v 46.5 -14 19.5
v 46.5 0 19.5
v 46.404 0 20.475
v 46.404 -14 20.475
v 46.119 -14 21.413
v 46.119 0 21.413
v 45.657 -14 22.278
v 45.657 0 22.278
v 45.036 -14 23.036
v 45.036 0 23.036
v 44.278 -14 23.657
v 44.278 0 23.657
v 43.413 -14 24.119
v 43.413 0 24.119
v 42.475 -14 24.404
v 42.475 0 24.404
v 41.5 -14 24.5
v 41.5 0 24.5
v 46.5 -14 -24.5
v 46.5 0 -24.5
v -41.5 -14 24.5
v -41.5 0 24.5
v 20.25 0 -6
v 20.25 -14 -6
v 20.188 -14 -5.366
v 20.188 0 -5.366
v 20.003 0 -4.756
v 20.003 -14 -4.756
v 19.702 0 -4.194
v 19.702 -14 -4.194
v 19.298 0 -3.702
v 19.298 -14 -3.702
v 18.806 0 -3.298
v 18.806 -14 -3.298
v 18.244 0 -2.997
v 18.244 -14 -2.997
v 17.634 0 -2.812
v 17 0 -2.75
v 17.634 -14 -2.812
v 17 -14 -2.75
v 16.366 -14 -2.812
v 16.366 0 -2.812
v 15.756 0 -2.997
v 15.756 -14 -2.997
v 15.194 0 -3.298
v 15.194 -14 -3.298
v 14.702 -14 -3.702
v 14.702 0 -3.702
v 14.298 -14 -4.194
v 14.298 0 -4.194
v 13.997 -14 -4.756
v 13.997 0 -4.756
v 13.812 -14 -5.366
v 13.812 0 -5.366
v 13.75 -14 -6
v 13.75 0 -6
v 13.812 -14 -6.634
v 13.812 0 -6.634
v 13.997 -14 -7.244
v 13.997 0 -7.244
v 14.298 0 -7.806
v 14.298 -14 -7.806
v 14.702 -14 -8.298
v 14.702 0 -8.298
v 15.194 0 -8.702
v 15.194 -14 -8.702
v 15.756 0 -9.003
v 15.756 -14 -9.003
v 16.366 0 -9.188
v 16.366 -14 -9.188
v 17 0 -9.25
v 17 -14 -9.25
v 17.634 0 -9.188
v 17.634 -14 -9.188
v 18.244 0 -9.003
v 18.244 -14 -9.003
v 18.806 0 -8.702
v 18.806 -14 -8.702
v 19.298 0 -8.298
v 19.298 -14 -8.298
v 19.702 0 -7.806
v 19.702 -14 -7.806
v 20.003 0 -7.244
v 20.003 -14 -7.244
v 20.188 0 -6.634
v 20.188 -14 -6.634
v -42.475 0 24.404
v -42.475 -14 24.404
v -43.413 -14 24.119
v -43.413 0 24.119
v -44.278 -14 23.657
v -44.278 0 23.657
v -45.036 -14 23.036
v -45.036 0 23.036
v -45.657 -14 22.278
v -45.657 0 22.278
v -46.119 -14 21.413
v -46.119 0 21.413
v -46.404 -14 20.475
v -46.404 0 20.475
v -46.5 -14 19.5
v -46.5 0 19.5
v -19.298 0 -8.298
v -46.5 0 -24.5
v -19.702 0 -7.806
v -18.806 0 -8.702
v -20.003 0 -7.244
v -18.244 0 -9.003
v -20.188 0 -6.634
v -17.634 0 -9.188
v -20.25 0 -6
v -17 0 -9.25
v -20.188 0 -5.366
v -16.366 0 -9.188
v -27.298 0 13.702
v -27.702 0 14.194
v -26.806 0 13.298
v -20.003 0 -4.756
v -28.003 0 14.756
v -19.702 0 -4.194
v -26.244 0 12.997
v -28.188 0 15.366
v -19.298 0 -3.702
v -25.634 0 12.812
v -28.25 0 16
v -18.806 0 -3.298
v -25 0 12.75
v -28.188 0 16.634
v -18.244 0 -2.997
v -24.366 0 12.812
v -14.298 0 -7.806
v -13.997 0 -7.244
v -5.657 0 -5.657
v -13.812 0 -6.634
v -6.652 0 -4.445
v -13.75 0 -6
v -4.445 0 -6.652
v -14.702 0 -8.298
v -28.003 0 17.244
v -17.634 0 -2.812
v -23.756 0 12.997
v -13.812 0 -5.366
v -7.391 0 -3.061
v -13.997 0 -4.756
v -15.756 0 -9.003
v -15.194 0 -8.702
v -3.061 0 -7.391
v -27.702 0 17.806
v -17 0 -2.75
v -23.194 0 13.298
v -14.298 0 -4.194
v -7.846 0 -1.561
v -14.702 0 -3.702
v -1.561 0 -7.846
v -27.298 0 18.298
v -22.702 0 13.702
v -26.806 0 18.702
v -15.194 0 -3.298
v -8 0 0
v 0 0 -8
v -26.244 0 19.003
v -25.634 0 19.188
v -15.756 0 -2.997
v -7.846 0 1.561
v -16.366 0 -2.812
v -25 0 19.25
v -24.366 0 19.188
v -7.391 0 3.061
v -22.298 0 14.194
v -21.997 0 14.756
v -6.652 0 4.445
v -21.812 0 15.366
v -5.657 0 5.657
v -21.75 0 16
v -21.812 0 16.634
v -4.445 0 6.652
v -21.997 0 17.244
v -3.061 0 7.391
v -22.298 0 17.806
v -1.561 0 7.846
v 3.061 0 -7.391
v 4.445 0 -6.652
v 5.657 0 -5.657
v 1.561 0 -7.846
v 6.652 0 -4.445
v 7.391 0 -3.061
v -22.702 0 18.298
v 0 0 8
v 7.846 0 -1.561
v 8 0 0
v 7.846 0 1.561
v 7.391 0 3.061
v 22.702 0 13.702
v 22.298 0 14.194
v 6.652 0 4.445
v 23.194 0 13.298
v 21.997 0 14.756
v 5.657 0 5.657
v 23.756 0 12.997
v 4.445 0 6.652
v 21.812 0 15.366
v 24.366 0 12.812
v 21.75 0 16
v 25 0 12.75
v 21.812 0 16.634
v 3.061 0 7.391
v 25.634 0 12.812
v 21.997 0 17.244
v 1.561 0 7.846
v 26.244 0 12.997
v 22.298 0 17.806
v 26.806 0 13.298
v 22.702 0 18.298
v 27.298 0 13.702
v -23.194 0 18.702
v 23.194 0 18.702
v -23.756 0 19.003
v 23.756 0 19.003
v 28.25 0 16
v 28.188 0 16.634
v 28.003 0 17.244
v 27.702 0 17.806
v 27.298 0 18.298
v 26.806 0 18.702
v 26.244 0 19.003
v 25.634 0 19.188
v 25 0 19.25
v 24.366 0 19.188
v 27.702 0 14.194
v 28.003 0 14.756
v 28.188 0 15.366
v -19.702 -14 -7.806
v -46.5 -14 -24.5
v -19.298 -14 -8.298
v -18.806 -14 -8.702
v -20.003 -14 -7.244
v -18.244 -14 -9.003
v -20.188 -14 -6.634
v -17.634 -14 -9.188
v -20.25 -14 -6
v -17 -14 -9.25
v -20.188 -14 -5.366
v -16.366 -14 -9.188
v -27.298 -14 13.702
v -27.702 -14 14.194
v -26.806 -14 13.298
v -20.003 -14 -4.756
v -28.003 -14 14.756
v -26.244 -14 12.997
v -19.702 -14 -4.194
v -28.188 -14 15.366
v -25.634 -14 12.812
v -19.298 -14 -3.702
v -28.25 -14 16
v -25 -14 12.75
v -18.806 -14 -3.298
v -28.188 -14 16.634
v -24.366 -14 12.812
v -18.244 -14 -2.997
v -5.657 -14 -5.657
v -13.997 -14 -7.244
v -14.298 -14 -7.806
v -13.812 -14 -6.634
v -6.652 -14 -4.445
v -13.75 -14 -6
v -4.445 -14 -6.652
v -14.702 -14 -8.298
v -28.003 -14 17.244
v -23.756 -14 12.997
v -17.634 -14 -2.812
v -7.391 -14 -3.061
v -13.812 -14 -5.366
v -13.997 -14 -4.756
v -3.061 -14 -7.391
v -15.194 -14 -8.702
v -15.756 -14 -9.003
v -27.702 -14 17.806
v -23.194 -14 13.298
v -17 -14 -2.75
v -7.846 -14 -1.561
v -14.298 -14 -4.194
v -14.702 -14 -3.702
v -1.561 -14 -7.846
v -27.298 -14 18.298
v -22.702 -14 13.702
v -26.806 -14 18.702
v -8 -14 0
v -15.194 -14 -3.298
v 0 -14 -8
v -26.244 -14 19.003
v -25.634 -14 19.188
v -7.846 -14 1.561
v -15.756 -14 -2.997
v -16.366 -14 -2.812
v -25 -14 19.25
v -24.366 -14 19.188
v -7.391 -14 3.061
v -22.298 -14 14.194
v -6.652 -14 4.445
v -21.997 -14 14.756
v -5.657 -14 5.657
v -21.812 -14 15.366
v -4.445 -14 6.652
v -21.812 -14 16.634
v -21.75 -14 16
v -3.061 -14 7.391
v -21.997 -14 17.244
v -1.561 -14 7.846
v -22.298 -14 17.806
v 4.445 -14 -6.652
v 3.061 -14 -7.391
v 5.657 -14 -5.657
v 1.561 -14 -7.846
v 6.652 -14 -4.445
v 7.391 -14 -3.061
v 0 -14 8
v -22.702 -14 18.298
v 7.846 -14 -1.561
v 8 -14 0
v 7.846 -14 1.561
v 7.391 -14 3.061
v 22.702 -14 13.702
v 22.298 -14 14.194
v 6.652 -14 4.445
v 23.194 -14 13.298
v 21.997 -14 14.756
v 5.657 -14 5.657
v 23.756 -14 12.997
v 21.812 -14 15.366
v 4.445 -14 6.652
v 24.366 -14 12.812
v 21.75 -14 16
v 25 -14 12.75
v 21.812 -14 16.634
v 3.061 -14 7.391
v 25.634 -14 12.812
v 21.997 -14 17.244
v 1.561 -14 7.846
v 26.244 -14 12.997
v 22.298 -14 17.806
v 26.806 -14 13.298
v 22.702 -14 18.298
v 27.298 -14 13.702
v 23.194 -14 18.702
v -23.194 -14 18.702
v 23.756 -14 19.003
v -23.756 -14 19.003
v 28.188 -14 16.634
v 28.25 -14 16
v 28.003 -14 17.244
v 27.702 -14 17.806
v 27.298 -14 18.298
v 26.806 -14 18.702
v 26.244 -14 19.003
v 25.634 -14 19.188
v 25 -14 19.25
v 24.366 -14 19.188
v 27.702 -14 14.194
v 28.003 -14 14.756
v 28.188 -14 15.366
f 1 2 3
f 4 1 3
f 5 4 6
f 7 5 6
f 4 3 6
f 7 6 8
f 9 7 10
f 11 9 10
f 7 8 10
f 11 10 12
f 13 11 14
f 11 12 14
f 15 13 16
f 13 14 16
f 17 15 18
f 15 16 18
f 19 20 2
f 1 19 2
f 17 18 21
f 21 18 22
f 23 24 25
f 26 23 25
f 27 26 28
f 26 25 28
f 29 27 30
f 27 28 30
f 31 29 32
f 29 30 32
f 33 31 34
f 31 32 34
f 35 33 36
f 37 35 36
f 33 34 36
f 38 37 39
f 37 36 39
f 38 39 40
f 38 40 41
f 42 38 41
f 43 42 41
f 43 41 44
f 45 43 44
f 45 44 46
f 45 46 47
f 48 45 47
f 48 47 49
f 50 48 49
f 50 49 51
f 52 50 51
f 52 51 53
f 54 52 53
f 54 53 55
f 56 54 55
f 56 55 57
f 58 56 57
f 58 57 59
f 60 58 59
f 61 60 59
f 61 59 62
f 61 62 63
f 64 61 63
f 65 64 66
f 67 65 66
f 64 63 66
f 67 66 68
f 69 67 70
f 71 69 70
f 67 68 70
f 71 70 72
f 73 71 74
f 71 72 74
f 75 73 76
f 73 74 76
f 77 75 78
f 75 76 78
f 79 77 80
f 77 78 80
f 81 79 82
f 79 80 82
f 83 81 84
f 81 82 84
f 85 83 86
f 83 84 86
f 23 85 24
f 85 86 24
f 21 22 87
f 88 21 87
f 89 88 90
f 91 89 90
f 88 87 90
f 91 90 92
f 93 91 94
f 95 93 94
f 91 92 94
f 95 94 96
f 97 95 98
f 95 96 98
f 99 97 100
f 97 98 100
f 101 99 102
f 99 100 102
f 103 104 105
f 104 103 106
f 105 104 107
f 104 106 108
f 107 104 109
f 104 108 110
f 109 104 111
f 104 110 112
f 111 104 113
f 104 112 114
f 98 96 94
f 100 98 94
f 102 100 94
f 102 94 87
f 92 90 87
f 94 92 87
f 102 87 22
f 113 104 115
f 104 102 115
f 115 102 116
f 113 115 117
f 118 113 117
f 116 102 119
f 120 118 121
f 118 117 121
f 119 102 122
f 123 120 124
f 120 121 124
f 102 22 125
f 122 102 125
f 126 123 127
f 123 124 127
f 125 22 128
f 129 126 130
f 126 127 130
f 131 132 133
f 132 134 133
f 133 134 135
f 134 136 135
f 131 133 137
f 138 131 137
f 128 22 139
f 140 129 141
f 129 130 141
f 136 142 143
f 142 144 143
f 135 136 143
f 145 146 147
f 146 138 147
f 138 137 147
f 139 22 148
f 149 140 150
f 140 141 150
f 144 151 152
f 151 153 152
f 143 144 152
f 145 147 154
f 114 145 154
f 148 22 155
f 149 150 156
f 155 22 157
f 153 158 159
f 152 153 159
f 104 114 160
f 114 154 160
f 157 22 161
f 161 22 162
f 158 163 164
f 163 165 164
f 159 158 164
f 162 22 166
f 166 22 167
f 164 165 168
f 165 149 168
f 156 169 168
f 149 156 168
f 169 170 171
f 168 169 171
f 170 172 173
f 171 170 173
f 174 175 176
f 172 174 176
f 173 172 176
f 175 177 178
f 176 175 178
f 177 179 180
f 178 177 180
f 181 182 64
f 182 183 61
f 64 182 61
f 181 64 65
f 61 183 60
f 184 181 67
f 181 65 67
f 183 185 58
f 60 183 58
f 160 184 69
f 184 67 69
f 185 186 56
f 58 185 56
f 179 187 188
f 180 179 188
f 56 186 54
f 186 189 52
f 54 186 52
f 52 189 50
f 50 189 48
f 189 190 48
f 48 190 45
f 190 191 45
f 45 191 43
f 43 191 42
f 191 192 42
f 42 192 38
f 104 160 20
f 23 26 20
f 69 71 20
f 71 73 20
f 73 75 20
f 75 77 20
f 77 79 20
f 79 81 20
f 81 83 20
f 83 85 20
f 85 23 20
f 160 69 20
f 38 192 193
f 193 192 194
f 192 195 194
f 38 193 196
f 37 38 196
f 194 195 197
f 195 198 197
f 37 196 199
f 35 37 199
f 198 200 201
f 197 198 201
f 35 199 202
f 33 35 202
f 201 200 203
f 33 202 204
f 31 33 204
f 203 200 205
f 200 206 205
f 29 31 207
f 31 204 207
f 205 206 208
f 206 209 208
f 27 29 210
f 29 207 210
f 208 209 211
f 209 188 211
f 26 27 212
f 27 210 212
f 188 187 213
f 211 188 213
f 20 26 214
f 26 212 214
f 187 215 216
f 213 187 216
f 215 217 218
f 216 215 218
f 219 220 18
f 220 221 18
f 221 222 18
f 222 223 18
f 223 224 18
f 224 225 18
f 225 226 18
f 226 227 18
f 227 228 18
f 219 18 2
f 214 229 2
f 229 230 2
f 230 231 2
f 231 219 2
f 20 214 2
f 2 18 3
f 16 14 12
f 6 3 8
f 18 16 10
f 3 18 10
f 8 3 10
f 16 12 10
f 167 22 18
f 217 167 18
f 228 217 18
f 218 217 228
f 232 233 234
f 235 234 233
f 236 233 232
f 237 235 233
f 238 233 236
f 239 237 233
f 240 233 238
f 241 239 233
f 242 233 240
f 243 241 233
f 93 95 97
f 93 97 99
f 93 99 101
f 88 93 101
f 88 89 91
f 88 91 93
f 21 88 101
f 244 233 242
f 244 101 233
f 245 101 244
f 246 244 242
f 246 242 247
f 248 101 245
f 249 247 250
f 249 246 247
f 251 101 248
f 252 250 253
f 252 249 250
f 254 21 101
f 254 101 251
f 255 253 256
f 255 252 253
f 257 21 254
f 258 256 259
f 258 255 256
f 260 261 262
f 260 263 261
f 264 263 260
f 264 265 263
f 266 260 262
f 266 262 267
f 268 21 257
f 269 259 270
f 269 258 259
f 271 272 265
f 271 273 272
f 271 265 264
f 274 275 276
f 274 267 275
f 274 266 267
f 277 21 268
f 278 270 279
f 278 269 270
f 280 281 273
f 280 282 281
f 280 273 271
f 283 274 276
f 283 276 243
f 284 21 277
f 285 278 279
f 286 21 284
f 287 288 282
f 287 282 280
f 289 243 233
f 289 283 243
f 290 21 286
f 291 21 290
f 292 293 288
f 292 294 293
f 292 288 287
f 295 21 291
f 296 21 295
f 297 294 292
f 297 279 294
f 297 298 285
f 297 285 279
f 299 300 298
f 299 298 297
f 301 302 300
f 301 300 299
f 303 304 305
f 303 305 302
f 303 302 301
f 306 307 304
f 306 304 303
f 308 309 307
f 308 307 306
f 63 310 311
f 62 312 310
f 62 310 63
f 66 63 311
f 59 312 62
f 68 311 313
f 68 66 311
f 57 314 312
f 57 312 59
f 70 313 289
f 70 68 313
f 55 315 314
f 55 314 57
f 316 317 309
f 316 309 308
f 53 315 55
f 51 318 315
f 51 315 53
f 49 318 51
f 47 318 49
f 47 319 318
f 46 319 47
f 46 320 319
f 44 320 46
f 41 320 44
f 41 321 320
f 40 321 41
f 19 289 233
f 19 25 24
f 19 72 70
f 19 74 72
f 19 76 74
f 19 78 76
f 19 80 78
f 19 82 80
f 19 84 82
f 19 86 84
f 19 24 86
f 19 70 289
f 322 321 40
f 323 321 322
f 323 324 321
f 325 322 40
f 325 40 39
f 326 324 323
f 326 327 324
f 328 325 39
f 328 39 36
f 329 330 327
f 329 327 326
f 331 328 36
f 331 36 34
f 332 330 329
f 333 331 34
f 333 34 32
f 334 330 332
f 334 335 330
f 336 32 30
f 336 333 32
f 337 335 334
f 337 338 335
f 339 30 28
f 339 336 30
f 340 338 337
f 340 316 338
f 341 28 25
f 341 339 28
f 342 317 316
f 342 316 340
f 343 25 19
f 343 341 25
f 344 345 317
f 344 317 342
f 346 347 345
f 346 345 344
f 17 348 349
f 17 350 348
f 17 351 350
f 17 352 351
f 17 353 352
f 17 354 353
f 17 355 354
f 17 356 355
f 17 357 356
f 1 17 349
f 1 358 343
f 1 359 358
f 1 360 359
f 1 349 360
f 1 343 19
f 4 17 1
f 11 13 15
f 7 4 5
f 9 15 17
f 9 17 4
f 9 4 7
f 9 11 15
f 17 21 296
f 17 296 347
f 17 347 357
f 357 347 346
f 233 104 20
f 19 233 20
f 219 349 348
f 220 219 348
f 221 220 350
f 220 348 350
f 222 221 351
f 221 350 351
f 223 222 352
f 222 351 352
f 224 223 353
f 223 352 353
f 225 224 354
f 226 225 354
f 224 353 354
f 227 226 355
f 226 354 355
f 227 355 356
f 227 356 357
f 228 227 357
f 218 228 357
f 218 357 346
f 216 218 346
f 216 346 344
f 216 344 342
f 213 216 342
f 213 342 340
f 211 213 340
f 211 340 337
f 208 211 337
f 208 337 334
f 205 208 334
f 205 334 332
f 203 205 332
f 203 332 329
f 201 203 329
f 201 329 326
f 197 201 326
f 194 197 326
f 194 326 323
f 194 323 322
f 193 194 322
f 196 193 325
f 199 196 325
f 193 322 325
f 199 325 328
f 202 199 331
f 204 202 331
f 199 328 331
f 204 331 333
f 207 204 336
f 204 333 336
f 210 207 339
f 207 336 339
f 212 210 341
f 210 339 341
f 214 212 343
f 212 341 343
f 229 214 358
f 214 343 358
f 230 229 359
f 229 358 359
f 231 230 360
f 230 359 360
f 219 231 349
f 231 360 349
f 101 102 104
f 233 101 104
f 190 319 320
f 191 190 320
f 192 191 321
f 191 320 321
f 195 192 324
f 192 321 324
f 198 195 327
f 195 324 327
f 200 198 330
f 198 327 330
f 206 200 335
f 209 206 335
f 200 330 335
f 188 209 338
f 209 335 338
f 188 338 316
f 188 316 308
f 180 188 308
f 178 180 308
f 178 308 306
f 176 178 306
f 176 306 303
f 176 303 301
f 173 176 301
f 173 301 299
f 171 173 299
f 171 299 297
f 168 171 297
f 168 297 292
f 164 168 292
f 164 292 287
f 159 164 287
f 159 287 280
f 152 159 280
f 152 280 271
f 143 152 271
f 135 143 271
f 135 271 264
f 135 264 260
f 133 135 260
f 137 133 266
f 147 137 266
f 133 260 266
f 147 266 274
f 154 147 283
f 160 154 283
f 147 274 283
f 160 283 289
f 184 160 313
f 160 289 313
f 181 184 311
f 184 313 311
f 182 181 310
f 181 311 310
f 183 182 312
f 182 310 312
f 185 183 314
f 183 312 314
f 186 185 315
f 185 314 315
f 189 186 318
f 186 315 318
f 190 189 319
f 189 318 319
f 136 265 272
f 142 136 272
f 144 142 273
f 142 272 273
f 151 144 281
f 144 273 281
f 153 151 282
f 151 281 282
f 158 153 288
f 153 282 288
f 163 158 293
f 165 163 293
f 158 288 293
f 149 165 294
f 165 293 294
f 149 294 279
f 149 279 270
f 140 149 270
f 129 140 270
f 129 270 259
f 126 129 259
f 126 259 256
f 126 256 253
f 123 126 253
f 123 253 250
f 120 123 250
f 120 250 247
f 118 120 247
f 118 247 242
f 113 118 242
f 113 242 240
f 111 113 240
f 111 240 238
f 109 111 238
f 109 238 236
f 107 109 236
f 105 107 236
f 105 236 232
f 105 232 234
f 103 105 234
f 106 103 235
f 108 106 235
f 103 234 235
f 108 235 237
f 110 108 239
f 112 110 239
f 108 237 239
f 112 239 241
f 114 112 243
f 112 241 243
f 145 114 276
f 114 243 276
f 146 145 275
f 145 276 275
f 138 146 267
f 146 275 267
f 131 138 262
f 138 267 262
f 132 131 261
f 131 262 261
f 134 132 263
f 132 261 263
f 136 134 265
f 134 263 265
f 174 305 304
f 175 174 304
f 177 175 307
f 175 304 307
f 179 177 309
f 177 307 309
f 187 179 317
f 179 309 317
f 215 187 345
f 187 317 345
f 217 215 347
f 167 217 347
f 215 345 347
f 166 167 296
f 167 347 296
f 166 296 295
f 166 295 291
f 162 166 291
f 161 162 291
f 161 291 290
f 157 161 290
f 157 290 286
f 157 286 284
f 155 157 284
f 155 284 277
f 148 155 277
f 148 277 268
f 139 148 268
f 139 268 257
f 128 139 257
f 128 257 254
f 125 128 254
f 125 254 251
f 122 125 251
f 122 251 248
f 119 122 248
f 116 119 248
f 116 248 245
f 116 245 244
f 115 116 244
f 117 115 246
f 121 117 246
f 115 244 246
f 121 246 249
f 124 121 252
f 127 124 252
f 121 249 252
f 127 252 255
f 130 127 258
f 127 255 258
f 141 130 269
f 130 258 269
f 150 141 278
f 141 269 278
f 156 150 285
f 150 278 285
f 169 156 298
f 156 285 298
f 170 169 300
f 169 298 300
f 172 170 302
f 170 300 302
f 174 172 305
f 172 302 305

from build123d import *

# Parameters (mm, degrees)
F1_DEPTH = 14
F2_R     = 8
F2_R_2   = 3.25
F3_DEPTH = 14.001


with BuildPart() as f1:
    # F0 (on Front) → F1 (new body)
    with BuildSketch(Plane.XZ):
        with BuildLine():
            Line((-46.5, -24.5), (46.5, -24.5))
            Line((46.5, -24.5), (46.5, 19.5))
            ThreePointArc((46.5, 19.5), (45.035534, 23.035534), (41.5, 24.5))
            Line((41.5, 24.5), (-41.5, 24.5))
            ThreePointArc((-41.5, 24.5), (-45.035534, 23.035534), (-46.5, 19.5))
            Line((-46.5, 19.5), (-46.5, -24.5))
        make_face()
    extrude(amount=F1_DEPTH)

    # F2 (on face) → F3 (cut, through all)
    with BuildSketch(Plane.XZ.offset(14)):
        Circle(F2_R)
        with Locations((-17, -6)):
            Circle(F2_R_2)
        with Locations((-25, 16)):
            Circle(F2_R_2)
        with Locations((25, 16)):
            Circle(F2_R_2)
        with Locations((17, -6)):
            Circle(F2_R_2)
    extrude(amount=-F3_DEPTH, mode=Mode.SUBTRACT)


solid = f1.part
